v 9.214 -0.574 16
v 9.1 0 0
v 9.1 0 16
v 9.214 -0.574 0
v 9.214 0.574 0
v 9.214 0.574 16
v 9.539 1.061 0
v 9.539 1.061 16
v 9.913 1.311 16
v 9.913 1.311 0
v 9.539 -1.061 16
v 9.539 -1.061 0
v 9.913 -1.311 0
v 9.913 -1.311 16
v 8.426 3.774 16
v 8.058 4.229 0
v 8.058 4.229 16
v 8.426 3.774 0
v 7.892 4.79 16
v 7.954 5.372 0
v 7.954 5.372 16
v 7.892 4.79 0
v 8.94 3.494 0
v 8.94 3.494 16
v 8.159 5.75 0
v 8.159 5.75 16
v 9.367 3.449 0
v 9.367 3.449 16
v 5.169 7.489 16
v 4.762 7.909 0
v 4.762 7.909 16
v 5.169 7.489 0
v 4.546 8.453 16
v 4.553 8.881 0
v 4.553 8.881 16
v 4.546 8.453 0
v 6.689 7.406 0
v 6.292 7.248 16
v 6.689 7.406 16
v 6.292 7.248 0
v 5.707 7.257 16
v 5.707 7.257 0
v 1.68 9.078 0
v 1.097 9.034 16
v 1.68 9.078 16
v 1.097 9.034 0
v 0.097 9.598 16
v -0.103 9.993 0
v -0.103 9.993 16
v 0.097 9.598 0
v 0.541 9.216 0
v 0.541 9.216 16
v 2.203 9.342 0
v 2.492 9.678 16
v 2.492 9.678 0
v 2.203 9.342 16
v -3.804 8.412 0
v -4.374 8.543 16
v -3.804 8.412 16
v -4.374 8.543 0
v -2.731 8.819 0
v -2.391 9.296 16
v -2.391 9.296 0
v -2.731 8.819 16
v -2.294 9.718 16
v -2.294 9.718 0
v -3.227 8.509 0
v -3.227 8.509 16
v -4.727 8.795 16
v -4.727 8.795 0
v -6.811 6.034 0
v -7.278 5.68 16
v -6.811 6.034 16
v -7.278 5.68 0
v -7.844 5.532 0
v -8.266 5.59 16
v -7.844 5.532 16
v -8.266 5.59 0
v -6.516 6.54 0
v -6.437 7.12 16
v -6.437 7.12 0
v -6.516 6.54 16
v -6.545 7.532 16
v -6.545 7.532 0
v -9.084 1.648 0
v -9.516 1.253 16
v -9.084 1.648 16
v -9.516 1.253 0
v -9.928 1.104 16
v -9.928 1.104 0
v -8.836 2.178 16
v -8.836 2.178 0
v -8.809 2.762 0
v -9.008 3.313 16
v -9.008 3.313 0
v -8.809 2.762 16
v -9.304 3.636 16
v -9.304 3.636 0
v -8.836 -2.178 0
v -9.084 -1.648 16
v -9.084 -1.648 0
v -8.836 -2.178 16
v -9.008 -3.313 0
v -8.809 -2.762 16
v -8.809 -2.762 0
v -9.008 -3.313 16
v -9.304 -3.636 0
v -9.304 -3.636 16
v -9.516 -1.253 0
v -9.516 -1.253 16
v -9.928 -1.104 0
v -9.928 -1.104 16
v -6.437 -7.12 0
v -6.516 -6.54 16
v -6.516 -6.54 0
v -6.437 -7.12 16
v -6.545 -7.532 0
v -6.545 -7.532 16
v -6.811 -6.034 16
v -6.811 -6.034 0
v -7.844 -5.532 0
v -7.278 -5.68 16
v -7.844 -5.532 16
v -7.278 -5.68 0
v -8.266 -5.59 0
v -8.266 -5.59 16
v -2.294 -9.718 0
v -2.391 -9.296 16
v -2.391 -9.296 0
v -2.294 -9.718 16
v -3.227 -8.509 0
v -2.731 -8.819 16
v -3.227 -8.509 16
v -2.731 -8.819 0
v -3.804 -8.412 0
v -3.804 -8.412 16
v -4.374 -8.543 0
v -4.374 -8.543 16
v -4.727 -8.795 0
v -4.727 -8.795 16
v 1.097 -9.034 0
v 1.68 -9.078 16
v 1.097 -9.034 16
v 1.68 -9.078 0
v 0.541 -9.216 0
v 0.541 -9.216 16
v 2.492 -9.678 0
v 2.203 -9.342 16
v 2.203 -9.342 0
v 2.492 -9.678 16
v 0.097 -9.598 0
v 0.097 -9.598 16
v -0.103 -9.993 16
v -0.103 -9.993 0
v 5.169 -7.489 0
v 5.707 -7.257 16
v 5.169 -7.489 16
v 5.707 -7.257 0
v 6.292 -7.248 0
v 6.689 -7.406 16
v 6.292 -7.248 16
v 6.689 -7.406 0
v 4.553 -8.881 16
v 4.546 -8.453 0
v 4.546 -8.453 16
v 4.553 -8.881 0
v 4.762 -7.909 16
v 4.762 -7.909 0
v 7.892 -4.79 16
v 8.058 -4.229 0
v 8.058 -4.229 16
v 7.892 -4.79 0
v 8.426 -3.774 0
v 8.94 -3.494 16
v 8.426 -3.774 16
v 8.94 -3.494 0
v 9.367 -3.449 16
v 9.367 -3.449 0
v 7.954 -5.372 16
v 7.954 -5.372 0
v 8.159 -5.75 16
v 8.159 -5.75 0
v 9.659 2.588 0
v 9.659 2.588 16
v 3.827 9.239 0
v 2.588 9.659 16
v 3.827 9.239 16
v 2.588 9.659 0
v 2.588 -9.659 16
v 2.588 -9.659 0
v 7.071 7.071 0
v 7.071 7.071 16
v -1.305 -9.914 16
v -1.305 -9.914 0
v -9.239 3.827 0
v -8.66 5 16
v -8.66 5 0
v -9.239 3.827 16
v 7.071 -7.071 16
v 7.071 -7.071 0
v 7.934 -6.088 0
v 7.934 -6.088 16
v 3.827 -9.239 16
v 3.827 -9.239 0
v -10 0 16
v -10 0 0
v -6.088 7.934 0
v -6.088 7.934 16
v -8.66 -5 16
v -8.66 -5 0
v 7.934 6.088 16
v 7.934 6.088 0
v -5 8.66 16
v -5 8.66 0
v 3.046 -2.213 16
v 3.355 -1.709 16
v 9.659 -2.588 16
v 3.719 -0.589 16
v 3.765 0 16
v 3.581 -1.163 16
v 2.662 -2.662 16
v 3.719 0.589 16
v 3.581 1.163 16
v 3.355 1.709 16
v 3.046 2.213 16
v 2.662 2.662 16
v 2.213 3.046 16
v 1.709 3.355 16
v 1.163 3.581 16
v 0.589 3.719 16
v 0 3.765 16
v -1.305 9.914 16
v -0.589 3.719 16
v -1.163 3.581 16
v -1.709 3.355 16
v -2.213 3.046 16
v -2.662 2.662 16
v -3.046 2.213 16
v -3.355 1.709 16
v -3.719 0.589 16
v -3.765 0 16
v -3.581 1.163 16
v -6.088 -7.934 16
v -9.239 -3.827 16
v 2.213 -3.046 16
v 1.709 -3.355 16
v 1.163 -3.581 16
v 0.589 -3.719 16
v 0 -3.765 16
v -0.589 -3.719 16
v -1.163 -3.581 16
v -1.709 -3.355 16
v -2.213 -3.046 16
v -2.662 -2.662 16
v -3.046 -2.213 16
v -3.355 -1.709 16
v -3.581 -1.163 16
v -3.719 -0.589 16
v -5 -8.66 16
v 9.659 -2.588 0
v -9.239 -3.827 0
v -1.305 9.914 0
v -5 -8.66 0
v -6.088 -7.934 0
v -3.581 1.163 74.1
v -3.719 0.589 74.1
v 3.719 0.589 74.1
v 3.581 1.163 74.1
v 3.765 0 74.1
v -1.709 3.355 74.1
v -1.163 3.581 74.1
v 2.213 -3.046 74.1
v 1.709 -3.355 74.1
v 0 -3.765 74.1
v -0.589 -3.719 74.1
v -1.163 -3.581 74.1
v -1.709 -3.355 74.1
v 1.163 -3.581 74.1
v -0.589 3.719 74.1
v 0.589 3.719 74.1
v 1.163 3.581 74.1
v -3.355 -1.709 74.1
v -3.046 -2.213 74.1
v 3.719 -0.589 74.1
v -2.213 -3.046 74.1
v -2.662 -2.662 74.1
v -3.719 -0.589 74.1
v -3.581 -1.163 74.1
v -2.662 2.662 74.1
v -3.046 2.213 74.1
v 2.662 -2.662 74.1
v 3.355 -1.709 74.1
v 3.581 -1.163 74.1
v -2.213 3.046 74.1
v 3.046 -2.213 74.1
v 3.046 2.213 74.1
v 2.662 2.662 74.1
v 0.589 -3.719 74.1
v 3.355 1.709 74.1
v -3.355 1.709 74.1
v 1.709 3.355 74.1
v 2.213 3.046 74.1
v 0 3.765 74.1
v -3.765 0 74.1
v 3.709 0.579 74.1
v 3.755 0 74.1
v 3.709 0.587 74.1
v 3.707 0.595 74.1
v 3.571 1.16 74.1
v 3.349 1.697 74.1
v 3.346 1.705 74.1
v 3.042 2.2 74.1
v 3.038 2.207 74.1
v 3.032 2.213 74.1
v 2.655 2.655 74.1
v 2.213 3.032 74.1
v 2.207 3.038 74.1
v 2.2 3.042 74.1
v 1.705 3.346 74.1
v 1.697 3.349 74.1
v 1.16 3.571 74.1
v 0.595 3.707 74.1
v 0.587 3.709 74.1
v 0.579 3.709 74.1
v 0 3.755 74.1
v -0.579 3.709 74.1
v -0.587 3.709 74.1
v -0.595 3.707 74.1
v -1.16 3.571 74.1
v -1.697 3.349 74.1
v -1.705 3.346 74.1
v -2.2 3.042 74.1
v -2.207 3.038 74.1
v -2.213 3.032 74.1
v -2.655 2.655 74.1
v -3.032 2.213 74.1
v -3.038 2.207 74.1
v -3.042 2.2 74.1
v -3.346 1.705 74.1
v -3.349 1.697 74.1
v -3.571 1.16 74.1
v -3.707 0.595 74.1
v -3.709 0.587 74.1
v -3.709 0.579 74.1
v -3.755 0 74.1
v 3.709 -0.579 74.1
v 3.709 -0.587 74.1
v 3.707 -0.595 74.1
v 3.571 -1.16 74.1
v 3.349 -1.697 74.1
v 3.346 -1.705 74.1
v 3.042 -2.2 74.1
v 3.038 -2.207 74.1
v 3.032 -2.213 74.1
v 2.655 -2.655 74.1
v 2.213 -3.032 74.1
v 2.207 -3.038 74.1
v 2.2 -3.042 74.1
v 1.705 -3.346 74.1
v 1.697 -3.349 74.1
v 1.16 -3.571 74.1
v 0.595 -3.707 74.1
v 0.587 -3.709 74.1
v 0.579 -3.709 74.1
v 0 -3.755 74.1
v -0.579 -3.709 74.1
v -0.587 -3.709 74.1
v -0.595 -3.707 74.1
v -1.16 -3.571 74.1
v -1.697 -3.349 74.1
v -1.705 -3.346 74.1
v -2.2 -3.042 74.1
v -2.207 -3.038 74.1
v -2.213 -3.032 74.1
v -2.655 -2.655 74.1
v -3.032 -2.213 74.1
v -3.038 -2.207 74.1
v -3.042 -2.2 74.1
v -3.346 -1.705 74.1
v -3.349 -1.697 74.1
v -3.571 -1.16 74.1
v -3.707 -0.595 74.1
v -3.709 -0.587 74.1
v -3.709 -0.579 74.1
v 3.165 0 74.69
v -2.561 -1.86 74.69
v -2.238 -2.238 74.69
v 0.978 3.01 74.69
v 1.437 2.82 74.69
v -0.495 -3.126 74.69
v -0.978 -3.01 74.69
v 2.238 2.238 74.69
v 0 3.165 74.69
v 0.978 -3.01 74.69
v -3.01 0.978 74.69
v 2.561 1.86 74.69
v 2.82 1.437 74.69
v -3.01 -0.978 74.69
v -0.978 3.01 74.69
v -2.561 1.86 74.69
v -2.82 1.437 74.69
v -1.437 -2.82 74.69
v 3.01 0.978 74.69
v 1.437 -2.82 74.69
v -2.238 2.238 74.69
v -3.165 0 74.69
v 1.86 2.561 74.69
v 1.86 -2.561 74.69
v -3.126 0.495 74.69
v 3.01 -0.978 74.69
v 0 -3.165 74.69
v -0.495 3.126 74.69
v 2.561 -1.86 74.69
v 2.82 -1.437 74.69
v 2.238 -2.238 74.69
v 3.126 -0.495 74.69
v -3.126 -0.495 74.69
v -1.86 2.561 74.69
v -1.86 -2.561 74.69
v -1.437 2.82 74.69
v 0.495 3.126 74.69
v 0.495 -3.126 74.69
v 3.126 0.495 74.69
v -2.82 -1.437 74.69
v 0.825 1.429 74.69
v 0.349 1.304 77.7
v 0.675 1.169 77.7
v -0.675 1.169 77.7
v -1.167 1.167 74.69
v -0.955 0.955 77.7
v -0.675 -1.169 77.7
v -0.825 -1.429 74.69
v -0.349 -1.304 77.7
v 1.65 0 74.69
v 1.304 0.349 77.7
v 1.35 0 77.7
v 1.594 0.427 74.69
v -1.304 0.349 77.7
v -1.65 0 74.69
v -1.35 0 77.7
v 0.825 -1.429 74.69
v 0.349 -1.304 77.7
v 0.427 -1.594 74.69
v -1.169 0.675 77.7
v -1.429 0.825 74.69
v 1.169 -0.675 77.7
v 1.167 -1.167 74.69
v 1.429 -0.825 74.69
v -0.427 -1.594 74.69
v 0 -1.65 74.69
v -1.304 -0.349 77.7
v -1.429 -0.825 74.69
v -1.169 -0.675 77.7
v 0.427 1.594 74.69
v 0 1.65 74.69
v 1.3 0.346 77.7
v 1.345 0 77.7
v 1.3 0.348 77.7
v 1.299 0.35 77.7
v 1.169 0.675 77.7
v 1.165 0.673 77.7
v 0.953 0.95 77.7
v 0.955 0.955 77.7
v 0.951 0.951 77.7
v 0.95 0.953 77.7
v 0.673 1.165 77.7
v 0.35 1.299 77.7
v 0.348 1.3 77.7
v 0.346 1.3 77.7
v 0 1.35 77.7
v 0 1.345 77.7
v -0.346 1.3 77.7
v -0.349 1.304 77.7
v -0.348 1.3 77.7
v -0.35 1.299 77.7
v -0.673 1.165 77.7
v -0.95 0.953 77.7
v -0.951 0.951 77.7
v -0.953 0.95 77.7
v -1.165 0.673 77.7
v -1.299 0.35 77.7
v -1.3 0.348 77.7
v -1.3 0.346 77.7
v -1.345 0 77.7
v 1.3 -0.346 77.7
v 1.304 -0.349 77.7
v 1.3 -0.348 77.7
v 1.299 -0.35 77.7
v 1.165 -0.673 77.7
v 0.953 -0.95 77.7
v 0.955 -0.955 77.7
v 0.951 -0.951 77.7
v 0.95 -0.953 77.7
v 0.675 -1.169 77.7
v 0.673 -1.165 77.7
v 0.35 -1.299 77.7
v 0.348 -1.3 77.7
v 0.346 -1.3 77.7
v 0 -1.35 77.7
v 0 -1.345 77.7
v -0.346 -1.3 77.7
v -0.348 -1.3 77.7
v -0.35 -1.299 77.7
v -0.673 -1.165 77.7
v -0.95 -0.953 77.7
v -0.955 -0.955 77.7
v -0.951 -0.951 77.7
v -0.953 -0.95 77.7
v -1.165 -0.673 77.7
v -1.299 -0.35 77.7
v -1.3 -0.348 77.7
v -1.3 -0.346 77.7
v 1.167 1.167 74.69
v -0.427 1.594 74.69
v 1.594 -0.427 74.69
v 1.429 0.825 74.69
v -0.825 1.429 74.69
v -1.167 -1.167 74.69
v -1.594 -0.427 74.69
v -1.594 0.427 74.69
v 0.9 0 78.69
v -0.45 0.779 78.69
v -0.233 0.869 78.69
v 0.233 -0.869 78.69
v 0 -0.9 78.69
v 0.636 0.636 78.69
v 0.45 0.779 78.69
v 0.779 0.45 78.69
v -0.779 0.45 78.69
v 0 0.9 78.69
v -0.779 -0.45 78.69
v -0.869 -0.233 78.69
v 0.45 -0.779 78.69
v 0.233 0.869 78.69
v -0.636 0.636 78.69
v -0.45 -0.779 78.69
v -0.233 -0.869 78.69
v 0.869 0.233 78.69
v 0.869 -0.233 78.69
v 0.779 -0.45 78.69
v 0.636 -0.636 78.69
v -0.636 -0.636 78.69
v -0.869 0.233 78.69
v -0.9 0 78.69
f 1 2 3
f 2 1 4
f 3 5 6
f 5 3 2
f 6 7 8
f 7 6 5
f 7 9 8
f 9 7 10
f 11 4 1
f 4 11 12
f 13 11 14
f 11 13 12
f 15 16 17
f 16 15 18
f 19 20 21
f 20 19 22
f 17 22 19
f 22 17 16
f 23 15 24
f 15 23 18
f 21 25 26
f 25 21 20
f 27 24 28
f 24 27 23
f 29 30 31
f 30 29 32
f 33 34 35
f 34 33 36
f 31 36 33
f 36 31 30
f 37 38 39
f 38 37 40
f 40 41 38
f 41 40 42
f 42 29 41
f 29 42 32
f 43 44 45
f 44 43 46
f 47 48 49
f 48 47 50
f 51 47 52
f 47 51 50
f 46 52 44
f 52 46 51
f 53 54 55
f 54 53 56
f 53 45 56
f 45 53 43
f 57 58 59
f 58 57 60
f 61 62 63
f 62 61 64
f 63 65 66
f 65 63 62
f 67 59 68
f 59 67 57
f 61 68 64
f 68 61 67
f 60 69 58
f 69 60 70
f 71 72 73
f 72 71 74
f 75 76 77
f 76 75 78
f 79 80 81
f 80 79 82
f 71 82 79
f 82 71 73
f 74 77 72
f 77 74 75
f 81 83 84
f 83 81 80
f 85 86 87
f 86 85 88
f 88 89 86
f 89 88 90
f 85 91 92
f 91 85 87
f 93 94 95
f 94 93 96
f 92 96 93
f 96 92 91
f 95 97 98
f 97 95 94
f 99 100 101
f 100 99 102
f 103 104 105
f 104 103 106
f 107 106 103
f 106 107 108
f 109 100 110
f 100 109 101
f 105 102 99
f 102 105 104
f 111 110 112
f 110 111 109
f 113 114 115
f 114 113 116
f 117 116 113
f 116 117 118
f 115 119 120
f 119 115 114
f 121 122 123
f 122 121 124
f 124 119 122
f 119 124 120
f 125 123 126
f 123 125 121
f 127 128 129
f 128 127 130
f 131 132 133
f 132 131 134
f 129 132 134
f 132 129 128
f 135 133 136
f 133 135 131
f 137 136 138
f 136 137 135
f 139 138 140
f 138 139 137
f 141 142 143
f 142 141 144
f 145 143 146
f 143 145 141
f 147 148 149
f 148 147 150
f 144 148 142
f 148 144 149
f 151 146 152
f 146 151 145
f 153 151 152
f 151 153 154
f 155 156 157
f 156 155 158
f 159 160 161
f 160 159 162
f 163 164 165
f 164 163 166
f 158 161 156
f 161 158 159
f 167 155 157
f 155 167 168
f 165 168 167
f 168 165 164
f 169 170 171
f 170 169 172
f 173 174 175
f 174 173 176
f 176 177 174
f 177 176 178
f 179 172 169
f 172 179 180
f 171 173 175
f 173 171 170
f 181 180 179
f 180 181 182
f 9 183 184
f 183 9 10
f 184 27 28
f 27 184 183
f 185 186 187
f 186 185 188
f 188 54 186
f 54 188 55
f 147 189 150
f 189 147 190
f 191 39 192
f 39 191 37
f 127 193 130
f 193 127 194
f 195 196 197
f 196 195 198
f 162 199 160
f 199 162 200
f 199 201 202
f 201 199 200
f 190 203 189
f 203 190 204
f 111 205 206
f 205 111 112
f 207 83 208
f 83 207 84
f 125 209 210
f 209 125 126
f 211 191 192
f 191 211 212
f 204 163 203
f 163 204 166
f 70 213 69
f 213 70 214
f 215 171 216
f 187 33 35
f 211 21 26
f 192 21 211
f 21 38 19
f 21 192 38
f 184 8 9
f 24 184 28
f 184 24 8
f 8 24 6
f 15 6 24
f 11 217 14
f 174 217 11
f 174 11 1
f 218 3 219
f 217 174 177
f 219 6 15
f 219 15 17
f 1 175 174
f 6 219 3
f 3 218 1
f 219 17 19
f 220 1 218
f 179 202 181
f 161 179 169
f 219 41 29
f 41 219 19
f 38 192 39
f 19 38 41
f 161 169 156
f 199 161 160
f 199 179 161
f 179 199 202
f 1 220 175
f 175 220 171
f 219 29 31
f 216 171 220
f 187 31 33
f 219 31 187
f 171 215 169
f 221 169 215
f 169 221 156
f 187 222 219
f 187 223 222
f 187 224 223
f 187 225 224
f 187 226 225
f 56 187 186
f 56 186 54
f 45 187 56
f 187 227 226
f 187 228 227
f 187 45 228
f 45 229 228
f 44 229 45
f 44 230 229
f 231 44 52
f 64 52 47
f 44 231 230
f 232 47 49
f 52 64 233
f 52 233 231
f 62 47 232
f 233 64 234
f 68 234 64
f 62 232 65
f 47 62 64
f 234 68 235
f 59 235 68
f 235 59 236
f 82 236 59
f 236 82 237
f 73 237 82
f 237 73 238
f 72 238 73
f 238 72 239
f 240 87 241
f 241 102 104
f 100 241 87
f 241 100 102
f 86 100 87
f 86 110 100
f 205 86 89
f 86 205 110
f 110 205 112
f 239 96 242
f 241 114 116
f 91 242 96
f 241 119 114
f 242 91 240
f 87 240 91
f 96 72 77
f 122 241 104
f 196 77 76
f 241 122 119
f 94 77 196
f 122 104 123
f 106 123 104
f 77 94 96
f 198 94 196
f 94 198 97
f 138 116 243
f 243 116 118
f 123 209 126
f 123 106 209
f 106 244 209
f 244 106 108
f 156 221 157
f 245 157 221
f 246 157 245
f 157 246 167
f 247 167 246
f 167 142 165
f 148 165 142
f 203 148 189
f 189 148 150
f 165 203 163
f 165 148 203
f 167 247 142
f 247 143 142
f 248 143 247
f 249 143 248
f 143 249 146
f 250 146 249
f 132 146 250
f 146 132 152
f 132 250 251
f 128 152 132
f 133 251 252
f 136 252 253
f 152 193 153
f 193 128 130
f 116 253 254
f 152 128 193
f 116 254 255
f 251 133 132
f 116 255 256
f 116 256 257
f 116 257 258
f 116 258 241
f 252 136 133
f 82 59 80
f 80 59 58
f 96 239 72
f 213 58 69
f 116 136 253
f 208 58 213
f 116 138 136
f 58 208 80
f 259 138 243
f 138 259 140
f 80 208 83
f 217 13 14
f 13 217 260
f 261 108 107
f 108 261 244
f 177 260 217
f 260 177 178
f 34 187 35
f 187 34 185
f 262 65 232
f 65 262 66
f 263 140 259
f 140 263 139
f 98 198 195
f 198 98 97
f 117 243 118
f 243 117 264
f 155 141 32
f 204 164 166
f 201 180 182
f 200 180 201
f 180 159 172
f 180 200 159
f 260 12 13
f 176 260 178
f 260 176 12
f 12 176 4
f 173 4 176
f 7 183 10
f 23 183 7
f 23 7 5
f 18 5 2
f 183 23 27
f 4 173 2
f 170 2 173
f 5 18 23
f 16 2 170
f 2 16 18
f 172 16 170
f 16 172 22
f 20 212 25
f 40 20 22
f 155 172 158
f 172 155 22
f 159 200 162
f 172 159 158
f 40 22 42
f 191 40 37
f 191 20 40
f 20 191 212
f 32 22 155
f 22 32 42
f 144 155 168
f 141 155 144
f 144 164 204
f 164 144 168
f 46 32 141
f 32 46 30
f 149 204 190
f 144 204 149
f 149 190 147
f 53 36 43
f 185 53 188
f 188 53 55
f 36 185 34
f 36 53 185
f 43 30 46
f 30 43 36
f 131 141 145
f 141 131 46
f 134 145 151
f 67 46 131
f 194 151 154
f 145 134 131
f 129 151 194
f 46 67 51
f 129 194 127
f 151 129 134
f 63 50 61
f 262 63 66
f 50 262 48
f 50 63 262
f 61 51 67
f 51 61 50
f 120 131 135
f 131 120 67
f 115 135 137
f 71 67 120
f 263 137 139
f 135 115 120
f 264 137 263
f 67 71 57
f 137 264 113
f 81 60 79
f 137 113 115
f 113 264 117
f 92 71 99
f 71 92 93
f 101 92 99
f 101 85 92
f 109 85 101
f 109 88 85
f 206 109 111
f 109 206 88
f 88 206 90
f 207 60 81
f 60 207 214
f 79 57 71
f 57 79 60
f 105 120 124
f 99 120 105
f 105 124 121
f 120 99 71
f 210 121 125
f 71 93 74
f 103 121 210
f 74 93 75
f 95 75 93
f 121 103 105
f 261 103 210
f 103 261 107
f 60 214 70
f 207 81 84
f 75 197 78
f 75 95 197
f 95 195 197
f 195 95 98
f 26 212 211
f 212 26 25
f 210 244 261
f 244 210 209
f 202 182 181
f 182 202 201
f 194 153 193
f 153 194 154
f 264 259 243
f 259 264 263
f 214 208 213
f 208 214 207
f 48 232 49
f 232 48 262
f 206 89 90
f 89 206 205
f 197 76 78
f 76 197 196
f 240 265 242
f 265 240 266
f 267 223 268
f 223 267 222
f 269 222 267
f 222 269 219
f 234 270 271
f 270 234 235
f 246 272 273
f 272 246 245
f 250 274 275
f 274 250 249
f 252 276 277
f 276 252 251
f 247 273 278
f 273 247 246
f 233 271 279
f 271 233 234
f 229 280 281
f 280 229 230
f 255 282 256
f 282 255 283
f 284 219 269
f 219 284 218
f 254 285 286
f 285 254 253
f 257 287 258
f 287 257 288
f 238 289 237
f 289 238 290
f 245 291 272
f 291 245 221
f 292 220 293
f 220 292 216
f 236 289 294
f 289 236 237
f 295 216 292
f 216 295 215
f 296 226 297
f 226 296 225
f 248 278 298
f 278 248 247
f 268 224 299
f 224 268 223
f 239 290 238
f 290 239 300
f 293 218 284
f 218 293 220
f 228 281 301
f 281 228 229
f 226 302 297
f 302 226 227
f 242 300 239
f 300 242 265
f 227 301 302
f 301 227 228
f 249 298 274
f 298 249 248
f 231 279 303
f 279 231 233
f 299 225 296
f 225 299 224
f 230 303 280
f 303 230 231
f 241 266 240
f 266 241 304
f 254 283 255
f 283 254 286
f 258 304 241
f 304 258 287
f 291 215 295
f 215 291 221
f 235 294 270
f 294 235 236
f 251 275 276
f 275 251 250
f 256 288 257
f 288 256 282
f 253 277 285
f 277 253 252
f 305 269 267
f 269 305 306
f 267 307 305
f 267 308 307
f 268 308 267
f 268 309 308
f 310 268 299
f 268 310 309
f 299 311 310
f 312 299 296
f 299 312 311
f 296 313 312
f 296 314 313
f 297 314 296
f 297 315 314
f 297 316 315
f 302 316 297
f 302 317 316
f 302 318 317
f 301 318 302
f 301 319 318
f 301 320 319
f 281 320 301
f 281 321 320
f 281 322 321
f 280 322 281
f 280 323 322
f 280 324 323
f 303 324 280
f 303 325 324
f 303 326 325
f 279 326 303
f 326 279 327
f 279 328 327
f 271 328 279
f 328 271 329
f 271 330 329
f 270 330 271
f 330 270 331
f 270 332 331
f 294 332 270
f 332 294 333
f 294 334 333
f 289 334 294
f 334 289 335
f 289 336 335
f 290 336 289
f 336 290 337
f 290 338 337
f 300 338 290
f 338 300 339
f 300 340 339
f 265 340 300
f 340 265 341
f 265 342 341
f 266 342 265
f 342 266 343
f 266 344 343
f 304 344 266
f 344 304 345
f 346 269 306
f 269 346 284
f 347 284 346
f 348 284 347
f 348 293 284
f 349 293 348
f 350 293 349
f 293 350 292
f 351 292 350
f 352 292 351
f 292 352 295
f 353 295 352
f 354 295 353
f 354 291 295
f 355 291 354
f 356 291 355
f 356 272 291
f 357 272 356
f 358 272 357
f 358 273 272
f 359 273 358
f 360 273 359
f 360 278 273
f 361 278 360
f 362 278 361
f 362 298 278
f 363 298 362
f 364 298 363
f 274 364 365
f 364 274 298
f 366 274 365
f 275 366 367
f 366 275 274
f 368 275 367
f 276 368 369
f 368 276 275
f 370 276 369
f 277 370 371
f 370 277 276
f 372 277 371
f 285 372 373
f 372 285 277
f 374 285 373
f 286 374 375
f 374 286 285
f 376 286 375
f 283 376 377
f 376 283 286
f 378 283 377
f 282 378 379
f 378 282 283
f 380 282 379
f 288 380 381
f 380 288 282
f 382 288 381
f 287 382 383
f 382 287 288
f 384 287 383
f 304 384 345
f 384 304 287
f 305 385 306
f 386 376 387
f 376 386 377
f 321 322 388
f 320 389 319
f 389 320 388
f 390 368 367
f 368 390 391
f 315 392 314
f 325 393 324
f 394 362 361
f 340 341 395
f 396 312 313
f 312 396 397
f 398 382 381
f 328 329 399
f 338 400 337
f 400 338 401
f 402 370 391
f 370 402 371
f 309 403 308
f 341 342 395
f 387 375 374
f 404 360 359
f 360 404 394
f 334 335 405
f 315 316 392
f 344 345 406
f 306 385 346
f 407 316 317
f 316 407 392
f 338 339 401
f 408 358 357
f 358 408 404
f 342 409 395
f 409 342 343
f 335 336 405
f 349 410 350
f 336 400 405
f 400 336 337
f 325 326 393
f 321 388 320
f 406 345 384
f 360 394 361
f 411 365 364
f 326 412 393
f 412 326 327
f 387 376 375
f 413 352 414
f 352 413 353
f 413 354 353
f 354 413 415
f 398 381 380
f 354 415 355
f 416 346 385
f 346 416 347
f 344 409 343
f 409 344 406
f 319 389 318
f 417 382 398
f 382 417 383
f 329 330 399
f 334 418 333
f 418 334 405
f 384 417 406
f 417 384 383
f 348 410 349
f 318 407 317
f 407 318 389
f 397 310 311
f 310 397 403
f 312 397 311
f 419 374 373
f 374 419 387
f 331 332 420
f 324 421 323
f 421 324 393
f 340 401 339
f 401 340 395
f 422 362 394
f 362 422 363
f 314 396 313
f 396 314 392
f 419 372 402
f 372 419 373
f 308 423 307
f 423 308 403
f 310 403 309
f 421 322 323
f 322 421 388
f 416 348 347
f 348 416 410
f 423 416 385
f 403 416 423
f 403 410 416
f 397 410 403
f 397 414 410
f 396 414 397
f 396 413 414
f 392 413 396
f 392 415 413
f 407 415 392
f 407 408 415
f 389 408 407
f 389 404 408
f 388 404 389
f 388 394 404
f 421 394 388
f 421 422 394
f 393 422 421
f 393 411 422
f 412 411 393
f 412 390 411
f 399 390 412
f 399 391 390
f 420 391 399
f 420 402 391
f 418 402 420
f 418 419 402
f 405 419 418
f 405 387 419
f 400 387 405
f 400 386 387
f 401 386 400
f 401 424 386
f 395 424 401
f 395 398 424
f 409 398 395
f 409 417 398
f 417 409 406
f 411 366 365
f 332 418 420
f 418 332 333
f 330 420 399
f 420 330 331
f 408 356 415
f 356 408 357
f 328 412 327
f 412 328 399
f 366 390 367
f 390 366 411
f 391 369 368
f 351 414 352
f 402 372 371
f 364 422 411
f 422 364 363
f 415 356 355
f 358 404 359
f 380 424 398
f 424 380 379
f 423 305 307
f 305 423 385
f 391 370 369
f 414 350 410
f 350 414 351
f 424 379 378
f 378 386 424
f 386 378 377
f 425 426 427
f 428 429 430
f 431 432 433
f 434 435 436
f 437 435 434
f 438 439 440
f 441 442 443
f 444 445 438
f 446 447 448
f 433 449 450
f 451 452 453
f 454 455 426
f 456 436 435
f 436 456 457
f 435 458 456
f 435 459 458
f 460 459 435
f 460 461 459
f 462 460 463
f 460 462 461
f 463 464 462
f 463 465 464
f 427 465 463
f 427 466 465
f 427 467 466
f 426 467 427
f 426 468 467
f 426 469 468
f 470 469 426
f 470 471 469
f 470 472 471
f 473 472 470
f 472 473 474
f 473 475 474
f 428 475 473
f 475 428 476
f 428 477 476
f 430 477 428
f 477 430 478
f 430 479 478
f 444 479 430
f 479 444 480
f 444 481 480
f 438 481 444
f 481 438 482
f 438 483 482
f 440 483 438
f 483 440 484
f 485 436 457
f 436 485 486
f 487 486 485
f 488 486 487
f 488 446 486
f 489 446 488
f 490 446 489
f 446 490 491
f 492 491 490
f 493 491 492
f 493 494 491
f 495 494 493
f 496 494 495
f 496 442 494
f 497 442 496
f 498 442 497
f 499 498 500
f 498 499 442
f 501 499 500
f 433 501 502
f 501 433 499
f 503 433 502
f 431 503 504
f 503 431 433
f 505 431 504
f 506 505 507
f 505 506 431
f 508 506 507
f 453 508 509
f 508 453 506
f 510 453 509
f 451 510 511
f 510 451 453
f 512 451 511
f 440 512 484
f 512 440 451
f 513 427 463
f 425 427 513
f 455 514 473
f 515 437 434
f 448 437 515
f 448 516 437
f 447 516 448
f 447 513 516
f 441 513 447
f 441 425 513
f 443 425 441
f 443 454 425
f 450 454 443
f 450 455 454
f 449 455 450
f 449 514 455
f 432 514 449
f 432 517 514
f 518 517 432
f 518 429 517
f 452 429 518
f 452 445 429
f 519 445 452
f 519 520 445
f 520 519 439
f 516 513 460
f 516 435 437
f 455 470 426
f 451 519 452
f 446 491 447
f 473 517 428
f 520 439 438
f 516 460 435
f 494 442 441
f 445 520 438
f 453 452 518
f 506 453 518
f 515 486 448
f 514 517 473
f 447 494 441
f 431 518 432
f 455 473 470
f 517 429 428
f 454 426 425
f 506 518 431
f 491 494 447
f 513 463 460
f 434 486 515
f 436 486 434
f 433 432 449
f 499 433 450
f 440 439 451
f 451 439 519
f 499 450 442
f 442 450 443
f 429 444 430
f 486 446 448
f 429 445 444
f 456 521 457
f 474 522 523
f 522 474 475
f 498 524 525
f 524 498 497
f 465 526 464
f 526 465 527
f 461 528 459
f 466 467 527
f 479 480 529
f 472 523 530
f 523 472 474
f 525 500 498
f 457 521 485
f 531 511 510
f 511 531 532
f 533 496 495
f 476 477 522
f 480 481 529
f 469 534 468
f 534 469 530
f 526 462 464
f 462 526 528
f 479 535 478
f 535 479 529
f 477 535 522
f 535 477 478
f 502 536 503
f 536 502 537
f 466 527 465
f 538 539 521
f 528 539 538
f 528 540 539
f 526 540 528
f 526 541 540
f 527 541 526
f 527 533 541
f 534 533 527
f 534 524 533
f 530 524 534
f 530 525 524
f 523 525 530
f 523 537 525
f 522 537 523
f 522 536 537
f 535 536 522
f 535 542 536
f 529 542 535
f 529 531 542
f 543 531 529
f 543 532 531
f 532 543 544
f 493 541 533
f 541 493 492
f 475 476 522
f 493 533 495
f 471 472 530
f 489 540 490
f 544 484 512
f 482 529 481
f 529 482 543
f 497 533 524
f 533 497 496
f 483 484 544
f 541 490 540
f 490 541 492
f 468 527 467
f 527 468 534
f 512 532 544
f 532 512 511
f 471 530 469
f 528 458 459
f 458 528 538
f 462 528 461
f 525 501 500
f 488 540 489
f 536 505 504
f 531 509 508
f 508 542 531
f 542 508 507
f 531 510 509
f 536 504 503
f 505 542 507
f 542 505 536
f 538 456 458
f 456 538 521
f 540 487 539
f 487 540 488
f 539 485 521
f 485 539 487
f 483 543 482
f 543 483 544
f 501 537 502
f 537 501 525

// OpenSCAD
// SPDX-License-Identifier: MIT
// Nut tool: a rod that carries a nut up a nut trap and holds it at its seat
// Copyright (c) 2026 Robert Drzyzgula
// All dimensions in mm unless noted.
//
// Push a nut onto the tip, slide it up the trap until it seats, and hold it
// there while you start the screw from the other side; once the screw has
// caught a couple of threads, pull the tool out and finish. The trap's hex
// keeps the nut from turning. The shaft is round and a little under the
// nut's width across flats, so it passes the trap; the shoulder at its end
// pushes the nut; the tip, tapered, holds the nut by its bore (the nylon
// insert of a locknut grips it well) and is pointed to find the hole.
//
// Pick a nut size, or "custom" and give the sizes yourself. Set the shaft
// length to the depth of your trap, from the face you push from to the
// nut's seat, less the nut's thickness. Print standing on the handle; no
// supports. Self-contained: no libraries needed.
//
// Spun off from the VSM Base (https://github.com/bobdrzyzgula/VSM-Base).

/* [Nut] */
// Nut size (sizes from common hex and nylon-insert locknuts); custom = use the settings below
nut_size = "#8-32"; // [#4-40, #6-32, #8-32, #10-24, #10-32, 1/4-20, M3, M4, M5, M6, custom]
// Custom: nut width across flats
custom_across_flats = 8.73; // [3 : 0.01 : 25]
// Custom: tip diameter, to fit the nut's bore (a locknut's nylon insert, about the thread's minor diameter)
custom_tip_d = 3.0; // [1 : 0.05 : 12]

/* [Tool] */
// Tip diameter; 0 = from the nut size
tip_d = 0; // [0 : 0.05 : 12]
// Tip length (keep it shorter than the nut, so the screw can catch before the tool comes out)
tip_len = 3; // [1 : 0.5 : 10]
// Tip taper: the tip is this much fatter at its root than at its end, so the bore grips it
tip_taper = 0.6; // [0 : 0.05 : 2]
// Shaft diameter; 0 = 1.2 mm under the nut's width across flats
shaft_d = 0; // [0 : 0.1 : 30]
// Shaft length, from the handle to the shoulder that pushes the nut
shaft_len = 58.7; // [5 : 0.5 : 250]
// Handle diameter
handle_d = 20; // [8 : 0.5 : 50]
// Handle length
handle_len = 16; // [5 : 0.5 : 60]
// Number of tools, side by side
count = 1; // [1 : 1 : 10]

/* [Hidden] */
// [name, across flats, tip diameter]
sizes = [["#4-40", 6.35, 2.2], ["#6-32", 7.94, 2.6], ["#8-32", 8.73, 3.0],
         ["#10-24", 9.53, 3.5], ["#10-32", 9.53, 3.8], ["1/4-20", 11.11, 5.0],
         ["M3", 5.5, 2.4], ["M4", 7.0, 3.2], ["M5", 8.0, 4.1], ["M6", 10.0, 4.9]];
row  = [for (r = sizes) if (r[0] == nut_size) r];
af   = nut_size == "custom" || len(row) == 0 ? custom_across_flats : row[0][1];
tip  = tip_d > 0 ? tip_d : nut_size == "custom" || len(row) == 0 ? custom_tip_d : row[0][2];
sd   = shaft_d > 0 ? shaft_d : af - 1.2;
hd   = max(handle_d, sd + 4);
$fs = 0.3;
$fa = 4;

echo(str("Nut tool: ", nut_size, " (", af, " mm across flats); shaft ", sd, " x ", shaft_len,
         " mm; tip ", tip + tip_taper / 2, " to ", tip - tip_taper / 2, " mm over ", tip_len,
         " mm; handle ", hd, " x ", handle_len, " mm"));
if (sd >= af)
    echo("WARNING: the shaft is as wide as the nut across flats; it won't pass the trap");
if (tip >= sd - 1)
    echo("WARNING: the tip leaves under 0.5 mm of shoulder to push the nut");

for (i = [0 : count - 1]) translate([i * (hd + 6), 0, 0]) nut_tool();

module nut_tool() {
    // fluted handle
    difference() {
        cylinder(h = handle_len, d = hd, $fn = 48);
        n = max(6, round(hd * PI / 5));
        for (k = [0 : n - 1]) rotate(k * 360 / n)
            translate([hd / 2 + 0.6, 0, -1]) cylinder(h = handle_len + 2, d = 3, $fn = 16);
    }
    // shaft, with a small chamfer at the shoulder
    translate([0, 0, handle_len - 0.01]) {
        cylinder(h = shaft_len - 0.6 + 0.01, d = sd, $fn = 40);
        translate([0, 0, shaft_len - 0.6]) cylinder(h = 0.6, d1 = sd, d2 = sd - 1.2, $fn = 40);
    }
    // tapered tip and its point
    translate([0, 0, handle_len + shaft_len - 0.01]) {
        cylinder(h = tip_len + 0.01, d1 = tip + tip_taper / 2, d2 = tip - tip_taper / 2, $fn = 24);
        translate([0, 0, tip_len]) cylinder(h = 1, d1 = tip - tip_taper / 2, d2 = max(0.4, tip - tip_taper / 2 - 0.9), $fn = 24);
    }
}
